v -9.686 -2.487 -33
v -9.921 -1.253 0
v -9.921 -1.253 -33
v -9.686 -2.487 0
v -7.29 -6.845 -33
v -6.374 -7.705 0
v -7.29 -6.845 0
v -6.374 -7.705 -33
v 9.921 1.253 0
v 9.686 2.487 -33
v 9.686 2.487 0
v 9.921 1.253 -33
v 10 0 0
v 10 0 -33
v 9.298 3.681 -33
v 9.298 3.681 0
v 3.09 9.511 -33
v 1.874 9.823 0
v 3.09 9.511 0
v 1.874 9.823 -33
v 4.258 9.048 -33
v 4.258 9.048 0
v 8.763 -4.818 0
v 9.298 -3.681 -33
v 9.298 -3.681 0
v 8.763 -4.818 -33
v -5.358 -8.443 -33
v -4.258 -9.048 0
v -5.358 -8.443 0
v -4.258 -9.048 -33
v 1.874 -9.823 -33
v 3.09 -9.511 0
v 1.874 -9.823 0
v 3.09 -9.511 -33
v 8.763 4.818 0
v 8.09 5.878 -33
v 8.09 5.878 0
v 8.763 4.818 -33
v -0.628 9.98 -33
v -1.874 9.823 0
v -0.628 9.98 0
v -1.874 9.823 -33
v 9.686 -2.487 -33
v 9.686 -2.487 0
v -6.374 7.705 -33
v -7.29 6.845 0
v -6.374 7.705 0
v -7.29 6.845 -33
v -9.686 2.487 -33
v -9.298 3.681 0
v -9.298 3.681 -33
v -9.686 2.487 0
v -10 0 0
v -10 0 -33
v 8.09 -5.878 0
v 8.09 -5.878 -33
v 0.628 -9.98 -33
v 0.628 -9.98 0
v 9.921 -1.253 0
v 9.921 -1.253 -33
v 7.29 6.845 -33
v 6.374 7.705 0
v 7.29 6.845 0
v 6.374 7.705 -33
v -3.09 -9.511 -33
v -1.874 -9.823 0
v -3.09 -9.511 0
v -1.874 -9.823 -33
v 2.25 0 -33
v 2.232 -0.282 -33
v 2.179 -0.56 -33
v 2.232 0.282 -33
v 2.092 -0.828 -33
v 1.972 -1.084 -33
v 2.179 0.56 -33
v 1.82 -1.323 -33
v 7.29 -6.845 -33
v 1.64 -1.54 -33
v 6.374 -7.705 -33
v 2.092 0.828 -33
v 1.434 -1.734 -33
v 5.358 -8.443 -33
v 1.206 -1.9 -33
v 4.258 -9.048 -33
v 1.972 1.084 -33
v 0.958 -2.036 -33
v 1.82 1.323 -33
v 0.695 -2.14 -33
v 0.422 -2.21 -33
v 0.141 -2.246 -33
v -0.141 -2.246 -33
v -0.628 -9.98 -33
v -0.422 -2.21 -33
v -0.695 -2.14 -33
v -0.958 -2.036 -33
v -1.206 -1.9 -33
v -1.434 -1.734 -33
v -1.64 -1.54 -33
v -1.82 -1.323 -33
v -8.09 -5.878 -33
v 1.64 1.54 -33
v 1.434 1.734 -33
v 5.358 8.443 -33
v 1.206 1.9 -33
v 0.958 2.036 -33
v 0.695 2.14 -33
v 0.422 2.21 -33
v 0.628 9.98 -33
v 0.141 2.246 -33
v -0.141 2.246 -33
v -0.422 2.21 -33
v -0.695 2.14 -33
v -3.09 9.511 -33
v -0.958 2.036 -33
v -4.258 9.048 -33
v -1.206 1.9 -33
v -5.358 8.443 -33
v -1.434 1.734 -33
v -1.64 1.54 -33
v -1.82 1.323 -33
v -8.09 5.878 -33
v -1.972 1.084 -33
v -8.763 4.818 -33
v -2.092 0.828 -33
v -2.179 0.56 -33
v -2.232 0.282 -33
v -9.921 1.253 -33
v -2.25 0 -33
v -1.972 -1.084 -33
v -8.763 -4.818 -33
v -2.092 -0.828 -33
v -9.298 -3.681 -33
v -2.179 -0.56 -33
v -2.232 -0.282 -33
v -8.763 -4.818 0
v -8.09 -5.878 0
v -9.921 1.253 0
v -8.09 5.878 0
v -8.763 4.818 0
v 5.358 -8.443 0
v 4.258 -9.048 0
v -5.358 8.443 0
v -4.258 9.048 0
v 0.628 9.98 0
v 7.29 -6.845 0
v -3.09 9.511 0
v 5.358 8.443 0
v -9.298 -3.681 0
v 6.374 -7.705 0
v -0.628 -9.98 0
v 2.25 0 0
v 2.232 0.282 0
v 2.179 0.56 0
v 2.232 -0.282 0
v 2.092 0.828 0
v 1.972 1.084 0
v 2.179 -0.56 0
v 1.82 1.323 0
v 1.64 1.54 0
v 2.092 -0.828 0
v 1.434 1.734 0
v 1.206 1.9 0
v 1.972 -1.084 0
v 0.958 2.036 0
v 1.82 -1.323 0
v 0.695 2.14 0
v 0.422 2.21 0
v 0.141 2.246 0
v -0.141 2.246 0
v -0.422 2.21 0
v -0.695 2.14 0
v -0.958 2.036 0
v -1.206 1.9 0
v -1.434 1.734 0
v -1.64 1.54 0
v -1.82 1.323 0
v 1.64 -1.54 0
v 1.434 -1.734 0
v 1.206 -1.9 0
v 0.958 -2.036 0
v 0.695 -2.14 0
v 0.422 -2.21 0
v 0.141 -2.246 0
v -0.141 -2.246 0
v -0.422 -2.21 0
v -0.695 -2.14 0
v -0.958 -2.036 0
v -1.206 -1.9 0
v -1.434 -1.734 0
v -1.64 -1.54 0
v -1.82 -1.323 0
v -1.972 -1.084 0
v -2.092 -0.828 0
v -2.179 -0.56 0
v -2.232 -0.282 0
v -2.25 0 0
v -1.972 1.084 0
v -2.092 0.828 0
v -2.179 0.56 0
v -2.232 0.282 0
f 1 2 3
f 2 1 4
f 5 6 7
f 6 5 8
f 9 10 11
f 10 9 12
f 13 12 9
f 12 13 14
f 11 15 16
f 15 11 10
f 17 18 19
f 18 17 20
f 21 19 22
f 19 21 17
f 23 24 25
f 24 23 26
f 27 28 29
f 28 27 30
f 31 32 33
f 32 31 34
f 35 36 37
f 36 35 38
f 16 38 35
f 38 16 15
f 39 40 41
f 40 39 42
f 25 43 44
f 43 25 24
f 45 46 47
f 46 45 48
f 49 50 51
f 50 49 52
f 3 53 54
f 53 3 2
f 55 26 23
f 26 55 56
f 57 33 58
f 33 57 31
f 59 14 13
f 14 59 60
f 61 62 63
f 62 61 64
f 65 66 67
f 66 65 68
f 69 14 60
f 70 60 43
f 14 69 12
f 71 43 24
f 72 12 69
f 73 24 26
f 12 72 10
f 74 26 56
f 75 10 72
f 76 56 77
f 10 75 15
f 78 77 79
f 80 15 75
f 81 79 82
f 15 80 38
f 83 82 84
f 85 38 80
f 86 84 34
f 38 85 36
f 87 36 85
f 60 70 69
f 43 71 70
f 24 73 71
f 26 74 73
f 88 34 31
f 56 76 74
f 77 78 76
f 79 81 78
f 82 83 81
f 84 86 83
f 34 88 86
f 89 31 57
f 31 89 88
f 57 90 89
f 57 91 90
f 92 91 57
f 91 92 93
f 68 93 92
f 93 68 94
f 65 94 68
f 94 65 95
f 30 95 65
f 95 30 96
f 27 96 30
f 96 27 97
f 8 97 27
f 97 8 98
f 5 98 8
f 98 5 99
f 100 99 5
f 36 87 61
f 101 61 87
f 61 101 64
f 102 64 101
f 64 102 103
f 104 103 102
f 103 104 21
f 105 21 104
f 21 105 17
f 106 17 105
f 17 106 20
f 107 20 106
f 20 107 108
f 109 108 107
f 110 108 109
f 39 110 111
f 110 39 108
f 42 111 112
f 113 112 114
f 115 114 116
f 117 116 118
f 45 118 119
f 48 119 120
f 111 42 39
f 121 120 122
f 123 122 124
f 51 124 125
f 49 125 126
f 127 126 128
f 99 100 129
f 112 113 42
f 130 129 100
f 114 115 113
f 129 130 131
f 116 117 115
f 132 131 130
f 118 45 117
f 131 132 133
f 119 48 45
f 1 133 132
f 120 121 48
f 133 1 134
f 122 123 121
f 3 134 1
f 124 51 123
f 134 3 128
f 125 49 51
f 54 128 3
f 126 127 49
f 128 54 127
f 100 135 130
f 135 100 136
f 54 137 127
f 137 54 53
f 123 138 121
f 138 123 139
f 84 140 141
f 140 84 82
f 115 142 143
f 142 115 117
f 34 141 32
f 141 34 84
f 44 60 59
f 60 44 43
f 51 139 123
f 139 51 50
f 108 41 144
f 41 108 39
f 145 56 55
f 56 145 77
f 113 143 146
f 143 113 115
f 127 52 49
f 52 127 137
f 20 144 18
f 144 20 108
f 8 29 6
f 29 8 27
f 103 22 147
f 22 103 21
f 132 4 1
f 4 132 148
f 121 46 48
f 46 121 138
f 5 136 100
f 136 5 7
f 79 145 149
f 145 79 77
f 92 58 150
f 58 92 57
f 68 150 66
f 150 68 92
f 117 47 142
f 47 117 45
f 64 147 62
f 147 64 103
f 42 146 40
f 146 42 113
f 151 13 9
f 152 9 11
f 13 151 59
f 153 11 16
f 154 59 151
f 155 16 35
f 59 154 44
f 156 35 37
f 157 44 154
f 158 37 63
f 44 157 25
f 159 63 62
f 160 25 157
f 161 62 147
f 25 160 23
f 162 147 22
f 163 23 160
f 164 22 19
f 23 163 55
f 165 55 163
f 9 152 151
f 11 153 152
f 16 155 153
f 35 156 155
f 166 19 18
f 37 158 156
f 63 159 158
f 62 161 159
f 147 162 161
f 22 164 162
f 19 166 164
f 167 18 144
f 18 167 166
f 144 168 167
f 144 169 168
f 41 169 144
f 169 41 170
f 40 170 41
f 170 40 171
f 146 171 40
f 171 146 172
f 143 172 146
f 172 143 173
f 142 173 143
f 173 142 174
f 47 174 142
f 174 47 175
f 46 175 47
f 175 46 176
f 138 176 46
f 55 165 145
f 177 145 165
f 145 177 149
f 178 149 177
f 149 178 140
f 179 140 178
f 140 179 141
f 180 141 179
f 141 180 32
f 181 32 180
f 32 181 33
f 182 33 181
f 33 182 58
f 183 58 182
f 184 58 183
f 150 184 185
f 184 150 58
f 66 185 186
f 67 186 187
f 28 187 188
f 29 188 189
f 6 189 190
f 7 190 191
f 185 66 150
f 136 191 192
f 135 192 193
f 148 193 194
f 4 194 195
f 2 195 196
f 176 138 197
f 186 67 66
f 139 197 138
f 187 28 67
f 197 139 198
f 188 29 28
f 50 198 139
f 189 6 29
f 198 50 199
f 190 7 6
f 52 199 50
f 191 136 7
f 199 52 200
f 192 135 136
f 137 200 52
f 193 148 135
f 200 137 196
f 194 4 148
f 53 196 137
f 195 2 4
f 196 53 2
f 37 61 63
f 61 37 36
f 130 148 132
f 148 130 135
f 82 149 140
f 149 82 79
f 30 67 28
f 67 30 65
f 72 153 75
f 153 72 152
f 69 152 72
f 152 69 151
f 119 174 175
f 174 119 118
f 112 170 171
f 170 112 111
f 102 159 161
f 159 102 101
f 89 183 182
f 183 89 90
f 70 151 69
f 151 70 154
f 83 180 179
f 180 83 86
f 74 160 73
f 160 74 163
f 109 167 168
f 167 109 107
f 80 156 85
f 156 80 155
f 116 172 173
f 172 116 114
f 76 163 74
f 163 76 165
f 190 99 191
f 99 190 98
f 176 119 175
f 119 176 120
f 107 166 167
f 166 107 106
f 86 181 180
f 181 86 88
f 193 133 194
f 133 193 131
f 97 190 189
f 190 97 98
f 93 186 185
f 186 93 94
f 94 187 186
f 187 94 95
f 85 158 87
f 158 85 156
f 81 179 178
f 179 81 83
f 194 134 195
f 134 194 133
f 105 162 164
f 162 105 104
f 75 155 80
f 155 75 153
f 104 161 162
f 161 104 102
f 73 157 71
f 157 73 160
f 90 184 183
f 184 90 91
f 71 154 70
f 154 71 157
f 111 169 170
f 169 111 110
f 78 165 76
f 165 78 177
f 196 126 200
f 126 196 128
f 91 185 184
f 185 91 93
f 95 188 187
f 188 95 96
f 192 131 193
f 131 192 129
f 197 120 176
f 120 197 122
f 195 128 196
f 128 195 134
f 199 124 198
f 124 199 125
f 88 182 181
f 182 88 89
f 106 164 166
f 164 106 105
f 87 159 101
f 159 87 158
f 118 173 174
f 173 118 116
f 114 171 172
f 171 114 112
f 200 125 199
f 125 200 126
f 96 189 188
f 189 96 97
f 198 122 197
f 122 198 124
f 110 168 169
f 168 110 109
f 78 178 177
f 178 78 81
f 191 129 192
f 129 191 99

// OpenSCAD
$fn = 50;


difference() {
	union() {
		translate(v = [0, 0, -33.0000000000]) {
			cylinder(h = 33, r = 10.0000000000);
		}
		cylinder(h = 0, r = 20.0000000000);
	}
	union() {
		#translate(v = [0, 0, -33]) {
			cylinder(h = 33, r = 2.2500000000);
		}
	}
}
